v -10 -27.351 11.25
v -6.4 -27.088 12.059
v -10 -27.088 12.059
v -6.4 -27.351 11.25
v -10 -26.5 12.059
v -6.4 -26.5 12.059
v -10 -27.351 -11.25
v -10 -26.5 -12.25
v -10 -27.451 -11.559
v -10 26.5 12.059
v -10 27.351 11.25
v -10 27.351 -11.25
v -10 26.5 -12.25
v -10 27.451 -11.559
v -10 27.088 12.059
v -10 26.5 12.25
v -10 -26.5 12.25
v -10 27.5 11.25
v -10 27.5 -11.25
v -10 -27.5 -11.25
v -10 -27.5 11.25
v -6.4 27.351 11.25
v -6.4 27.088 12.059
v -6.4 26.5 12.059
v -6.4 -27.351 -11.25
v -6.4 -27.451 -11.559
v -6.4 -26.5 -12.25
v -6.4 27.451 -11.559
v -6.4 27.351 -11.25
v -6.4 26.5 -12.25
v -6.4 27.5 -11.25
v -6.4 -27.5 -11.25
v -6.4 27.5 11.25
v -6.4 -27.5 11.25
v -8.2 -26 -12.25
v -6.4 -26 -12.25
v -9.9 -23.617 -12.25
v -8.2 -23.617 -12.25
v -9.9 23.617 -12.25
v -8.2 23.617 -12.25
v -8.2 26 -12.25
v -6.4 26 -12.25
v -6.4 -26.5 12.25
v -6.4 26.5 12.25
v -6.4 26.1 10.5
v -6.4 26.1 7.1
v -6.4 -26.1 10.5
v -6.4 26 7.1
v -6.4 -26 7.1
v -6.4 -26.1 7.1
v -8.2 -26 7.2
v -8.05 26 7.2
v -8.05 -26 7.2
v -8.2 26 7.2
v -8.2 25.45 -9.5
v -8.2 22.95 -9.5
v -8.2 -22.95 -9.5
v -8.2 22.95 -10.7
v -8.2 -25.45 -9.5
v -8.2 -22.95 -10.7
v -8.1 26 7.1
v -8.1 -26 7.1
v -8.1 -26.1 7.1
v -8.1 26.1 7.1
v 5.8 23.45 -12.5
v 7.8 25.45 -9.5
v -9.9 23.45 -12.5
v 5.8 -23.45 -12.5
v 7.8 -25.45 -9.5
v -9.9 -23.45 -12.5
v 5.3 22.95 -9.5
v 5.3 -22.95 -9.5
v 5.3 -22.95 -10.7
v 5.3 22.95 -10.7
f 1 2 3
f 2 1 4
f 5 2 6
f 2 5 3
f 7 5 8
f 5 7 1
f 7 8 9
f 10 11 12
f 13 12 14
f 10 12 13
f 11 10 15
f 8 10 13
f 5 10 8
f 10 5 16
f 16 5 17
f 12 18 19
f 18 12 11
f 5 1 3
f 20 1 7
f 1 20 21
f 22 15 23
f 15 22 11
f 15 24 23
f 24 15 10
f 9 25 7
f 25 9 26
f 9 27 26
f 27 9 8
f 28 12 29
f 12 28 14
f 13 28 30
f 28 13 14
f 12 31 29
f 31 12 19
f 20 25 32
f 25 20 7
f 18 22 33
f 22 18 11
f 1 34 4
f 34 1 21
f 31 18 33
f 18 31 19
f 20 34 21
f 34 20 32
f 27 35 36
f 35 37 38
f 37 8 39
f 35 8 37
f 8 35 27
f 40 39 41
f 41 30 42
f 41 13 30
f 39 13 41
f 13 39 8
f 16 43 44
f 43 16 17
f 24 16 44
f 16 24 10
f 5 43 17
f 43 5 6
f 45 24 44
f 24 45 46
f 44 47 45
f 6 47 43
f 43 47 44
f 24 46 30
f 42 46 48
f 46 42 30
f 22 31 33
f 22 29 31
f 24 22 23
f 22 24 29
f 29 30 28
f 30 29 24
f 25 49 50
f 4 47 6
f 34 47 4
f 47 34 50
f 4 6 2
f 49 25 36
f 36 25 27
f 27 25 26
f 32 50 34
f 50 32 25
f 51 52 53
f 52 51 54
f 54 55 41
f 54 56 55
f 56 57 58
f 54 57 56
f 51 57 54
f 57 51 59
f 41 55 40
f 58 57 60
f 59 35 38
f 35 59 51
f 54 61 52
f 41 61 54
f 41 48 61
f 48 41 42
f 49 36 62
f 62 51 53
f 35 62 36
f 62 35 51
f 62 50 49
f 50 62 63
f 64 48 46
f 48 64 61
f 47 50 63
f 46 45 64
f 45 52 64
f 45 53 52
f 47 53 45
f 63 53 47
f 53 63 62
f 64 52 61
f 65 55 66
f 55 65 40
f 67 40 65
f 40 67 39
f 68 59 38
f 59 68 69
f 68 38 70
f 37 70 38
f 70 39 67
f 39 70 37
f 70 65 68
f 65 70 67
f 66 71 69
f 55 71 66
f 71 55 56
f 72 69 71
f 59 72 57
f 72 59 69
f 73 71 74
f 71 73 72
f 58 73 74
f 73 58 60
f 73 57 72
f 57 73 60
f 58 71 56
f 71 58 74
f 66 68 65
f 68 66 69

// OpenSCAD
// file: box_params.scad
//CUSTOMIZER VARIABLES

// Wall thickness in mm
thickness=1.4; // [1:10]
// in mm
x_width=35;

// in mm
y_width=55;

// in mm
height=17;

// toleranse 
tol = 0.5;


// Corner roundover in mm (0=sharp corner)
radius=1; // [0:50]


// height in mm
lid_thickness=10;

tooth_angle = 104;
tooth_height = 1.5;
tooth_thickness = 12.4;
tooth_width = 2* tooth_height*tan(tooth_angle/2);

switch_hole_width = 7;
switch_hole_len = 11; // if switch in box
switch_len = 20.5;

main_hole_width = 7;
main_hole_len = 15; // if switch in box
//-----

// Screw pilot hole size
screw_pilot=1.125*1;

// Screw hole size
screw_hole=2.5*1;

// Whether you want the screw countersunk
screw_countersink=0*1;

text="";
textSize=14;
textThickness=2;

// =============== calculated variables
lid_height=height/4+min(height/4,lid_thickness);
corner_radius=min(radius,x_width/2,y_width/2);
xadj=x_width-(corner_radius*2);
yadj=y_width-(corner_radius*2);
snugfit=0.5/2;
// main file
// creates pbox.stl and plid.stl

//Based on:
// Sliding Project box V1.2, now with screw holes!
// John Newman, 25th November 2011


// A parameterised enclosure for electronic projects, with support for PCB slots, Screw holes and blocks
// and apertures in the lid and 'top' end.
// The lid slides on, which holds your PCB(s) in.
// Apertures are added with code in the modules "HoleInLid" and "HoleInEnd". See the comments.

// Outside dimensions of the box, and other structural dimensions
include <box_params.scad>;

no_floor = false;
//OutL = height*2+5;		// Length in mm
//OutL=73; Full size
OutL = 20;
OutW = 55 ; 	// Width in mm
OutD = x_width-10	;		// Depth in mm
WallT = 1.8	;	// Wall thickness (mm)

// PCB supports are defined by the distance to the underside of the PCB, from the top external of the box.
// Supports for the PCB are ribs above and below
PCBgap = 2 ;	// Slot size for PCB to slide into
PCB1 = 0 ;		// Position of first PCB (0 if none)
PCB2 = 0;		// Position of second PCB (0 if none)
PCB3 = 0 ;		// Position of third PCB (0 if none)

// Screw fasteners are positioned by defining their centre , below the top external surface
// They will be positioned on either side at that height. You have to make sure they are not in a PCB slot!
Screws1 = 0; //5 ;	// Position of screws
Screws2 = 0; //33;	// Second set of screws
// Optionally specify the screw hole diameter, to have the holes 'printed'. Otherwise drill them...
ScrewH = 3.0 ;	// Screw hole diameter, in base
ScrewL = 3.0 ;	// Screw hole diameter, in lid

// More obscure parameters
BRad = 1 ;		// Radius of curvature, box edges (mm)
// For wide boxes (>50/60mm) you may want to use this, or make WallT larger for rigidity.
Ridge = 0;		// Depth of reinforcing ridge at end of base. 0 to suppress, is WallT multiplier. (not mm!) e.g 1.5

Sdepth = 1.0 ;	// Depth of support ribs for Lid and PCB (mm)
Swidth = 2.5;
// Bevelled ridge to hold lid on (in mm)
RHeight = 3 ;	// Top ridge height
RWidth = 2 ;	// Top ridge width (out over the box)
// Plastic blocks to screw into
ScrewD = 10 ;	// Depth of screw block (which the screw goes into)
ScrewW = 1 ;	// Width of Screw block, and of countersink in lid
ScrewOffset = WallT/2+0.5;

Allow = 0.5;		// Allowance for fit of the lid. A gap around it, and elsewhere.


// *******************************  View / render options ********************************

// Print Box on on it's own
//translate([0,0,OutL/2-WallT]) rotate([0,-90,90]) pbox() ;  	// Rotate and position for printing


// Print Lid on it's own
//translate([0,0,OutD/2]) pboxlid() ;					// Rotate and position for printing


// Print both together (if they fit!)
//translate([0,-OutW/2-5,OutD/2]) 


pboxlid() ;
//translate([0,OutD/2+5,OutL/2-WallT]) rotate([0,-90,90]) 
//pbox() ;


// ***************  Your modules to add apertures to  ***************************

// These two modules are where you can put function calls to create holes
// You should use the functions shown in comments, where the
// parameters are in measured from the top left (outside dimension) when looking at the surface (ext).
// Do a test, you'll see how it goes.
// X is across, Y is down, W is x width, D is y depth.

// Called by pboxlid to make any required holes in the lid face
module HoleInLid() {
//	lidround(x,y,w);		// for round holes, X & Y give the centre
//	lidrect(x,y,w,d);		// for rectangular holes, X & Y give the top left corner
//	lidrect(13,15,34,10) ;
}


// Called by pbox to make any required holes in the end of the box
module HoleInEnd() {
//	endround(x,y,w);		// for round holes, X & Y give the centre
//	endrect(x,y,w,d);		// for rectangular holes, X & Y give the top left corner
}


// **************** Main Box and Lib modules  *************************

// The Project Box
module pbox() {
	blen = OutL-WallT*2 ;		// Len of box w/o endplate
	rheight = WallT * Ridge ;	// Ridge height, if any
	slen = OutW-WallT*2+0.2  ;	// Lib support at end length
	union () {
		difference() {
			rotate ([0,90,0]) roundedBox(OutD,OutW,blen,BRad,$fn=40) ;
			translate([WallT*2,0,WallT*2]) rotate ([0,90,0]) {        
        roundedBox(OutD+(WallT*2),OutW-(WallT*2),OutL,BRad) ;
      }
      echo("out is", OutD);
      translate([0,0,-OutD*0.5+WallT*0.5]) 
        //Remove Bottom
        if (no_floor) {
          rotate ([0,90,0]) {
            roundedBox((WallT*2),4+OutW-(WallT*2)+1,OutL+2,BRad) ;
          }
        }
			HoleInEnd() ;
		}
		topridge() ;		// Add a ridge around the top to hold the lid on
		// Add support to hold the lid up at the sides
		support(OutD/2-RHeight-0.5) ;		
		// Support the end of the lid
		translate([-(OutL/2-WallT*2+0.1),OutW/2-WallT-0.1,OutD/2-RHeight-0.6-Sdepth]) rotate([0,0,-90]) cube([slen,Swidth,Sdepth]) ;
        
     // Hole to enable sliding the cover further (If I get scaffold)
		//translate([-(OutL/2-WallT*2+0.1),OutW/2-WallT-0.1,Sdepth+OutD/2-RHeight-0.6-Sdepth]) rotate([0,0,-90]) cube([slen,Swidth,Sdepth]) ;
        
		// Optional reinforcing ridge
		if (Ridge != 0) {
			translate([OutL/2-WallT,-OutW/2+BRad,-OutD/2+WallT+rheight-0.1]) rotate([0,180,0]) halfslab(rheight*2,OutW-BRad*2,rheight) ;
		}
		if (PCB1 != 0) {
			support(OutD/2 - PCB1) ;	// Support under the PCB
			support(OutD/2 - (PCB1 - Sdepth - PCBgap)) ;	// Support over the PCB
		}
		if (PCB2 != 0) {
			support(OutD/2 - PCB2) ;	// Support under the PCB
			support(OutD/2 - (PCB2 - Sdepth - PCBgap)) ;	// Support over the PCB
		}
		if (PCB3 != 0) {
			support(OutD/2 - PCB3) ;	// Support under the PCB
			support(OutD/2 - (PCB3 - Sdepth - PCBgap)) ;	// Support over the PCB
		} 
		if (Screws1 != 0) {
			translate([OutL/2-WallT,OutW/2-ScrewW/2-Allow,OutD/2-Screws1]) rotate([0,-90,0]) sblock(ScrewW,ScrewH,ScrewD) ;
			translate([OutL/2-WallT,-(OutW/2-ScrewW/2)+Allow,OutD/2-Screws1]) rotate([0,90,180]) sblock(ScrewW,ScrewH,ScrewD) ;
		}
		if (Screws2 != 0) {
			translate([OutL/2-WallT,OutW/2-ScrewW/2-Allow,OutD/2-Screws2]) rotate([0,-90,0]) sblock(ScrewW,ScrewH,ScrewD) ;
			translate([OutL/2-WallT,-(OutW/2-ScrewW/2)+Allow,OutD/2-Screws2]) rotate([0,90,180]) sblock(ScrewW,ScrewH,ScrewD) ;
		}
	}
}

// Sliding lid for Box
module pboxlid() {
	wid = OutW-(WallT*2)-Allow ;
	dadj = Allow ;			// Depth adjustment of end plate, seems to help...
	union() {
		difference() {
			translate([0,0,0]) rotate ([0,90,0]) roundedBox(OutD-dadj,OutW,OutL,BRad) ;
			translate([-(OutL/2-WallT*2),-(OutW+5)/2,-(OutD/2+2.5)]) cube([OutL+5,OutW+5,OutD+5]) ;
			// Hollow out end plate
			//translate([-(OutL/2-WallT),-(OutW/2)+ScrewW+Allow+WallT,-(OutD/2)+0.1]) cube([10,OutW-(ScrewW+WallT+Allow)*2,OutD-WallT*3]) ;
			translate([-(OutL/2-WallT),-(OutW/2)+ScrewW+Allow,-(OutD/2)+0.1]) cube([10,OutW-(ScrewW+Allow)*2,OutD-WallT*3]) ;
			// Support wedge
			//translate([WallT*2-OutL/2+0.1,-(OutW/2)+ScrewW+Allow+WallT-0.1,OutD/2-WallT])
			//		rotate([0,180,0]) halfslab(WallT,OutW-(ScrewW+WallT+Allow-0.1)*2,WallT*2) ; 
			translate([WallT*2-OutL/2+0.1,-(OutW/2)+ScrewW+Allow-0.1,OutD/2-WallT])
					rotate([0,180,0]) halfslab(WallT,OutW-(ScrewW+Allow-0.1)*2,WallT*2) ; 
			// Screw countersinks as req
			if (Screws1 != 0) {
				translate([0.3-OutL/2,OutW/2-ScrewW/2-Allow-ScrewOffset,-OutD/2+Screws1+ScrewOffset]) rotate([0,90,0]) countersink() ;
				translate([0.3-OutL/2,-(OutW/2-ScrewW/2)+Allow+ScrewOffset,-OutD/2+Screws1+ScrewOffset]) rotate([0,90,0])  countersink() ;
			}
			if (Screws1 != 0 && ScrewL != 0) {
				translate([-(OutL/2 + 2),OutW/2-ScrewW/2-Allow-ScrewOffset,-OutD/2+Screws1+ScrewOffset])
					rotate([0,90,0]) cylinder(WallT*4,ScrewL/2,ScrewL/2,$fn=8) ;
				translate([-(OutL/2 + 2),-(OutW/2-ScrewW/2)+Allow+ScrewOffset,-OutD/2+Screws1+ScrewOffset])
					rotate([0,90,0]) cylinder(WallT*4,ScrewL/2,ScrewL/2,$fn=8) ;
			}
			if (Screws2 != 0) {
				translate([0.3-OutL/2,OutW/2-ScrewW/2-Allow-ScrewOffset,-OutD/2+Screws2-ScrewOffset]) rotate([0,90,0]) countersink() ;
				translate([0.3-OutL/2,-(OutW/2-ScrewW/2)+Allow+ScrewOffset,-OutD/2+Screws2-ScrewOffset]) rotate([0,90,0])  countersink() ;
			}
			if (Screws2 != 0 && ScrewL != 0) {
				translate([-(OutL/2 + 2),OutW/2-ScrewW/2-Allow-ScrewOffset,-OutD/2+Screws2-ScrewOffset])
					rotate([0,90,0]) cylinder(WallT*4,ScrewL/2,ScrewL/2,$fn=8) ;
				translate([-(OutL/2 + 2),-(OutW/2-ScrewW/2)+Allow+ScrewOffset,-OutD/2+Screws2-ScrewOffset]) 
					rotate([0,90,0]) cylinder(WallT*4,ScrewL/2,ScrewL/2,$fn=8) ;
			}
		}
		render() {
			translate([-(OutL/2-0.1),0,-OutD/2+RHeight]) rotate([180,0,0]) platform(RHeight,wid,wid-(RWidth*2),OutL-WallT-Allow) ;
		}
	}
}

// ****************** Worker modules  ************************

module countersink() {
	//difference() {
		union() {
			cylinder(WallT,ScrewW/2,1) ;
			translate([0,0,-(WallT-0.1)]) cylinder(WallT,ScrewW/2-1,ScrewW/2-1) ;
		}
	//}
}

// Platform bevelled on three sides
// Parameters are height, width at base, width at top and length
module platform(h,wb,wt,l) {
	difference() {
		polyhedron (points=[[0,-(wb/2),0],[l,-(wb/2),0],[l,(wb/2),0],[0,(wb/2),0], [0,-(wt/2),h],[l,-(wt/2),h],[l,(wt/2),h],[0,(wt/2),h] ], 
			faces=[[0,1,5],[0,5,4],[1,2,6],[1,6,5],[2,3,7],[2,7,6],[0,4,7],[0,7,3],[4,5,6],[4,6,7],[3,2,1],[3,1,0],]) ;
		translate([l/2-(RWidth+Allow),0,h/2-WallT]) cube([l,wt-1,h],true) ;
		translate([l-RWidth,-(OutW/2+4),RHeight]) rotate([0,90,0]) halfslab(RHeight,OutW+8,RWidth) ;
		HoleInLid() ;			// Call user code for aperature
	}
}

// Block for Screws
module sblock(outs,ins,len) { 
	cone = 20 ;
	outr = outs/2 - 0.5;
	inr = ins/2 ;
	outL = outr * 0.87;
	outS = outr/2 ;
	inL = inr * 0.87 ;
	inS = inr /2 ;
	difference() {
		union() {
			cylinder(len,outs/2,outs/2) ;
			translate([0,0,len-((sin(cone)*outs/2))]) rotate([-cone,0,0],[0,0,len]) cylinder((outs/2)/tan(cone),outs/2,0) ;
		}
		if (ins !=0) {
			// translate([0,0,-2]) cylinder(len+2,ins/2,ins/2) ;
			translate([0,0,-0.1]) linear_extrude(10,true,10,0) 
				polygon(points=[[0,outr],[outL,outS],[outL,-outS],[0,-outr],[-outL,-outS],[-outL,outS],[-inS,inL],
					[inS,inL],[inr,0],[inS,-inL],[-inS,-inL],[-inr,0]], 
					paths=[[0,7,1,8,2,9,3,10,4,11,5,6]],convexity=6) ;
		}
	}
}


// size is a vector [w, h, d]
module roundedBox(width, height, depth, radius) {
	size=[width, height, depth];
	cube(size - [2*radius,0,0], true);
	cube(size - [0,2*radius,0], true);
	for (x = [radius-size[0]/2, -radius+size[0]/2],
		y = [radius-size[1]/2, -radius+size[1]/2]) {
		translate([x,y,0]) cylinder(r=radius, h=size[2], center=true);
	}
}

//  Kind of triangle cross section beam w->X; d->Y; h->Z
module halfslab(w,d,h) {
	polyhedron ( points = [[0, 0, h], [0, d, h], [0, d, 0], [0, 0, 0], [w, 0, h], [w, d, h]], 
		faces = [[0,3,2], [0,2,1], [3,0,4], [1,2,5], [0,5,4], [0,1,5],  [5,2,4], [4,2,3], ]);
}

// Top ridge which retains the lid
module topridge() {
	blen = 0 ;
	translate([(OutL-WallT*2)/2-0.1, -(OutW/2-WallT+0.1),(OutD/2)-(RHeight+0.1)]) rotate([0,0,90]) halfslab(RWidth+0.2, OutL-(WallT*3), RHeight ) ;
	translate([-(OutL-WallT*4)/2+0.1, (OutW/2-WallT+0.1),(OutD/2)-(RHeight+0.1)]) rotate([0,0,-90]) halfslab(RWidth+0.2, OutL-(WallT*3), RHeight ) ;

	//translate([-(OutL/2-WallT*2+0.1),- (OutW/2-WallT+0.1),(OutD/2)-(RHeight+0.1)]) rotate([0,0,0]) halfslab(RWidth+0.2, OutW-(WallT*2), RHeight ) ;
}

// Support ridge for lid or PCB
module support(top) {
	translate([0,-(OutW/2-(WallT-0.1)),top]) rib() ;
	translate([0,(OutW/2-(WallT-0.1)-Swidth),top]) rib() ;
}

//Rib of support
module rib() {
	len = OutL - (WallT*3) - Allow ;			// Allow for 1 wall thickness at one end, 2 at the other, and an Allowance
	translate([-len/2 +0.1,0,-Sdepth]) cube([len,Swidth,Sdepth]) ;
}

module endround(x,y,w) {
	translate([-(10+OutL-WallT*4)/2,OutW/2-x,OutD/2-y]) rotate([0,90,0]) cylinder(10,w/2,w/2) ;
}

module endrect(x,y,w,d) {
	translate([-(10+OutL-WallT*4)/2,OutW/2-w-x,OutD/2-y]) rotate([0,90,0]) cube([d,w,10]) ;
}

module lidround(x,y,w) {
	translate([OutL-y,OutW/2-x,-10]) cylinder(20,w/2,w/2) ;
}

module lidrect(x,y,w,d) {
	translate([OutL-d-y,OutW/2-w-x,-8]) cube([d,w,20]) ;
}
